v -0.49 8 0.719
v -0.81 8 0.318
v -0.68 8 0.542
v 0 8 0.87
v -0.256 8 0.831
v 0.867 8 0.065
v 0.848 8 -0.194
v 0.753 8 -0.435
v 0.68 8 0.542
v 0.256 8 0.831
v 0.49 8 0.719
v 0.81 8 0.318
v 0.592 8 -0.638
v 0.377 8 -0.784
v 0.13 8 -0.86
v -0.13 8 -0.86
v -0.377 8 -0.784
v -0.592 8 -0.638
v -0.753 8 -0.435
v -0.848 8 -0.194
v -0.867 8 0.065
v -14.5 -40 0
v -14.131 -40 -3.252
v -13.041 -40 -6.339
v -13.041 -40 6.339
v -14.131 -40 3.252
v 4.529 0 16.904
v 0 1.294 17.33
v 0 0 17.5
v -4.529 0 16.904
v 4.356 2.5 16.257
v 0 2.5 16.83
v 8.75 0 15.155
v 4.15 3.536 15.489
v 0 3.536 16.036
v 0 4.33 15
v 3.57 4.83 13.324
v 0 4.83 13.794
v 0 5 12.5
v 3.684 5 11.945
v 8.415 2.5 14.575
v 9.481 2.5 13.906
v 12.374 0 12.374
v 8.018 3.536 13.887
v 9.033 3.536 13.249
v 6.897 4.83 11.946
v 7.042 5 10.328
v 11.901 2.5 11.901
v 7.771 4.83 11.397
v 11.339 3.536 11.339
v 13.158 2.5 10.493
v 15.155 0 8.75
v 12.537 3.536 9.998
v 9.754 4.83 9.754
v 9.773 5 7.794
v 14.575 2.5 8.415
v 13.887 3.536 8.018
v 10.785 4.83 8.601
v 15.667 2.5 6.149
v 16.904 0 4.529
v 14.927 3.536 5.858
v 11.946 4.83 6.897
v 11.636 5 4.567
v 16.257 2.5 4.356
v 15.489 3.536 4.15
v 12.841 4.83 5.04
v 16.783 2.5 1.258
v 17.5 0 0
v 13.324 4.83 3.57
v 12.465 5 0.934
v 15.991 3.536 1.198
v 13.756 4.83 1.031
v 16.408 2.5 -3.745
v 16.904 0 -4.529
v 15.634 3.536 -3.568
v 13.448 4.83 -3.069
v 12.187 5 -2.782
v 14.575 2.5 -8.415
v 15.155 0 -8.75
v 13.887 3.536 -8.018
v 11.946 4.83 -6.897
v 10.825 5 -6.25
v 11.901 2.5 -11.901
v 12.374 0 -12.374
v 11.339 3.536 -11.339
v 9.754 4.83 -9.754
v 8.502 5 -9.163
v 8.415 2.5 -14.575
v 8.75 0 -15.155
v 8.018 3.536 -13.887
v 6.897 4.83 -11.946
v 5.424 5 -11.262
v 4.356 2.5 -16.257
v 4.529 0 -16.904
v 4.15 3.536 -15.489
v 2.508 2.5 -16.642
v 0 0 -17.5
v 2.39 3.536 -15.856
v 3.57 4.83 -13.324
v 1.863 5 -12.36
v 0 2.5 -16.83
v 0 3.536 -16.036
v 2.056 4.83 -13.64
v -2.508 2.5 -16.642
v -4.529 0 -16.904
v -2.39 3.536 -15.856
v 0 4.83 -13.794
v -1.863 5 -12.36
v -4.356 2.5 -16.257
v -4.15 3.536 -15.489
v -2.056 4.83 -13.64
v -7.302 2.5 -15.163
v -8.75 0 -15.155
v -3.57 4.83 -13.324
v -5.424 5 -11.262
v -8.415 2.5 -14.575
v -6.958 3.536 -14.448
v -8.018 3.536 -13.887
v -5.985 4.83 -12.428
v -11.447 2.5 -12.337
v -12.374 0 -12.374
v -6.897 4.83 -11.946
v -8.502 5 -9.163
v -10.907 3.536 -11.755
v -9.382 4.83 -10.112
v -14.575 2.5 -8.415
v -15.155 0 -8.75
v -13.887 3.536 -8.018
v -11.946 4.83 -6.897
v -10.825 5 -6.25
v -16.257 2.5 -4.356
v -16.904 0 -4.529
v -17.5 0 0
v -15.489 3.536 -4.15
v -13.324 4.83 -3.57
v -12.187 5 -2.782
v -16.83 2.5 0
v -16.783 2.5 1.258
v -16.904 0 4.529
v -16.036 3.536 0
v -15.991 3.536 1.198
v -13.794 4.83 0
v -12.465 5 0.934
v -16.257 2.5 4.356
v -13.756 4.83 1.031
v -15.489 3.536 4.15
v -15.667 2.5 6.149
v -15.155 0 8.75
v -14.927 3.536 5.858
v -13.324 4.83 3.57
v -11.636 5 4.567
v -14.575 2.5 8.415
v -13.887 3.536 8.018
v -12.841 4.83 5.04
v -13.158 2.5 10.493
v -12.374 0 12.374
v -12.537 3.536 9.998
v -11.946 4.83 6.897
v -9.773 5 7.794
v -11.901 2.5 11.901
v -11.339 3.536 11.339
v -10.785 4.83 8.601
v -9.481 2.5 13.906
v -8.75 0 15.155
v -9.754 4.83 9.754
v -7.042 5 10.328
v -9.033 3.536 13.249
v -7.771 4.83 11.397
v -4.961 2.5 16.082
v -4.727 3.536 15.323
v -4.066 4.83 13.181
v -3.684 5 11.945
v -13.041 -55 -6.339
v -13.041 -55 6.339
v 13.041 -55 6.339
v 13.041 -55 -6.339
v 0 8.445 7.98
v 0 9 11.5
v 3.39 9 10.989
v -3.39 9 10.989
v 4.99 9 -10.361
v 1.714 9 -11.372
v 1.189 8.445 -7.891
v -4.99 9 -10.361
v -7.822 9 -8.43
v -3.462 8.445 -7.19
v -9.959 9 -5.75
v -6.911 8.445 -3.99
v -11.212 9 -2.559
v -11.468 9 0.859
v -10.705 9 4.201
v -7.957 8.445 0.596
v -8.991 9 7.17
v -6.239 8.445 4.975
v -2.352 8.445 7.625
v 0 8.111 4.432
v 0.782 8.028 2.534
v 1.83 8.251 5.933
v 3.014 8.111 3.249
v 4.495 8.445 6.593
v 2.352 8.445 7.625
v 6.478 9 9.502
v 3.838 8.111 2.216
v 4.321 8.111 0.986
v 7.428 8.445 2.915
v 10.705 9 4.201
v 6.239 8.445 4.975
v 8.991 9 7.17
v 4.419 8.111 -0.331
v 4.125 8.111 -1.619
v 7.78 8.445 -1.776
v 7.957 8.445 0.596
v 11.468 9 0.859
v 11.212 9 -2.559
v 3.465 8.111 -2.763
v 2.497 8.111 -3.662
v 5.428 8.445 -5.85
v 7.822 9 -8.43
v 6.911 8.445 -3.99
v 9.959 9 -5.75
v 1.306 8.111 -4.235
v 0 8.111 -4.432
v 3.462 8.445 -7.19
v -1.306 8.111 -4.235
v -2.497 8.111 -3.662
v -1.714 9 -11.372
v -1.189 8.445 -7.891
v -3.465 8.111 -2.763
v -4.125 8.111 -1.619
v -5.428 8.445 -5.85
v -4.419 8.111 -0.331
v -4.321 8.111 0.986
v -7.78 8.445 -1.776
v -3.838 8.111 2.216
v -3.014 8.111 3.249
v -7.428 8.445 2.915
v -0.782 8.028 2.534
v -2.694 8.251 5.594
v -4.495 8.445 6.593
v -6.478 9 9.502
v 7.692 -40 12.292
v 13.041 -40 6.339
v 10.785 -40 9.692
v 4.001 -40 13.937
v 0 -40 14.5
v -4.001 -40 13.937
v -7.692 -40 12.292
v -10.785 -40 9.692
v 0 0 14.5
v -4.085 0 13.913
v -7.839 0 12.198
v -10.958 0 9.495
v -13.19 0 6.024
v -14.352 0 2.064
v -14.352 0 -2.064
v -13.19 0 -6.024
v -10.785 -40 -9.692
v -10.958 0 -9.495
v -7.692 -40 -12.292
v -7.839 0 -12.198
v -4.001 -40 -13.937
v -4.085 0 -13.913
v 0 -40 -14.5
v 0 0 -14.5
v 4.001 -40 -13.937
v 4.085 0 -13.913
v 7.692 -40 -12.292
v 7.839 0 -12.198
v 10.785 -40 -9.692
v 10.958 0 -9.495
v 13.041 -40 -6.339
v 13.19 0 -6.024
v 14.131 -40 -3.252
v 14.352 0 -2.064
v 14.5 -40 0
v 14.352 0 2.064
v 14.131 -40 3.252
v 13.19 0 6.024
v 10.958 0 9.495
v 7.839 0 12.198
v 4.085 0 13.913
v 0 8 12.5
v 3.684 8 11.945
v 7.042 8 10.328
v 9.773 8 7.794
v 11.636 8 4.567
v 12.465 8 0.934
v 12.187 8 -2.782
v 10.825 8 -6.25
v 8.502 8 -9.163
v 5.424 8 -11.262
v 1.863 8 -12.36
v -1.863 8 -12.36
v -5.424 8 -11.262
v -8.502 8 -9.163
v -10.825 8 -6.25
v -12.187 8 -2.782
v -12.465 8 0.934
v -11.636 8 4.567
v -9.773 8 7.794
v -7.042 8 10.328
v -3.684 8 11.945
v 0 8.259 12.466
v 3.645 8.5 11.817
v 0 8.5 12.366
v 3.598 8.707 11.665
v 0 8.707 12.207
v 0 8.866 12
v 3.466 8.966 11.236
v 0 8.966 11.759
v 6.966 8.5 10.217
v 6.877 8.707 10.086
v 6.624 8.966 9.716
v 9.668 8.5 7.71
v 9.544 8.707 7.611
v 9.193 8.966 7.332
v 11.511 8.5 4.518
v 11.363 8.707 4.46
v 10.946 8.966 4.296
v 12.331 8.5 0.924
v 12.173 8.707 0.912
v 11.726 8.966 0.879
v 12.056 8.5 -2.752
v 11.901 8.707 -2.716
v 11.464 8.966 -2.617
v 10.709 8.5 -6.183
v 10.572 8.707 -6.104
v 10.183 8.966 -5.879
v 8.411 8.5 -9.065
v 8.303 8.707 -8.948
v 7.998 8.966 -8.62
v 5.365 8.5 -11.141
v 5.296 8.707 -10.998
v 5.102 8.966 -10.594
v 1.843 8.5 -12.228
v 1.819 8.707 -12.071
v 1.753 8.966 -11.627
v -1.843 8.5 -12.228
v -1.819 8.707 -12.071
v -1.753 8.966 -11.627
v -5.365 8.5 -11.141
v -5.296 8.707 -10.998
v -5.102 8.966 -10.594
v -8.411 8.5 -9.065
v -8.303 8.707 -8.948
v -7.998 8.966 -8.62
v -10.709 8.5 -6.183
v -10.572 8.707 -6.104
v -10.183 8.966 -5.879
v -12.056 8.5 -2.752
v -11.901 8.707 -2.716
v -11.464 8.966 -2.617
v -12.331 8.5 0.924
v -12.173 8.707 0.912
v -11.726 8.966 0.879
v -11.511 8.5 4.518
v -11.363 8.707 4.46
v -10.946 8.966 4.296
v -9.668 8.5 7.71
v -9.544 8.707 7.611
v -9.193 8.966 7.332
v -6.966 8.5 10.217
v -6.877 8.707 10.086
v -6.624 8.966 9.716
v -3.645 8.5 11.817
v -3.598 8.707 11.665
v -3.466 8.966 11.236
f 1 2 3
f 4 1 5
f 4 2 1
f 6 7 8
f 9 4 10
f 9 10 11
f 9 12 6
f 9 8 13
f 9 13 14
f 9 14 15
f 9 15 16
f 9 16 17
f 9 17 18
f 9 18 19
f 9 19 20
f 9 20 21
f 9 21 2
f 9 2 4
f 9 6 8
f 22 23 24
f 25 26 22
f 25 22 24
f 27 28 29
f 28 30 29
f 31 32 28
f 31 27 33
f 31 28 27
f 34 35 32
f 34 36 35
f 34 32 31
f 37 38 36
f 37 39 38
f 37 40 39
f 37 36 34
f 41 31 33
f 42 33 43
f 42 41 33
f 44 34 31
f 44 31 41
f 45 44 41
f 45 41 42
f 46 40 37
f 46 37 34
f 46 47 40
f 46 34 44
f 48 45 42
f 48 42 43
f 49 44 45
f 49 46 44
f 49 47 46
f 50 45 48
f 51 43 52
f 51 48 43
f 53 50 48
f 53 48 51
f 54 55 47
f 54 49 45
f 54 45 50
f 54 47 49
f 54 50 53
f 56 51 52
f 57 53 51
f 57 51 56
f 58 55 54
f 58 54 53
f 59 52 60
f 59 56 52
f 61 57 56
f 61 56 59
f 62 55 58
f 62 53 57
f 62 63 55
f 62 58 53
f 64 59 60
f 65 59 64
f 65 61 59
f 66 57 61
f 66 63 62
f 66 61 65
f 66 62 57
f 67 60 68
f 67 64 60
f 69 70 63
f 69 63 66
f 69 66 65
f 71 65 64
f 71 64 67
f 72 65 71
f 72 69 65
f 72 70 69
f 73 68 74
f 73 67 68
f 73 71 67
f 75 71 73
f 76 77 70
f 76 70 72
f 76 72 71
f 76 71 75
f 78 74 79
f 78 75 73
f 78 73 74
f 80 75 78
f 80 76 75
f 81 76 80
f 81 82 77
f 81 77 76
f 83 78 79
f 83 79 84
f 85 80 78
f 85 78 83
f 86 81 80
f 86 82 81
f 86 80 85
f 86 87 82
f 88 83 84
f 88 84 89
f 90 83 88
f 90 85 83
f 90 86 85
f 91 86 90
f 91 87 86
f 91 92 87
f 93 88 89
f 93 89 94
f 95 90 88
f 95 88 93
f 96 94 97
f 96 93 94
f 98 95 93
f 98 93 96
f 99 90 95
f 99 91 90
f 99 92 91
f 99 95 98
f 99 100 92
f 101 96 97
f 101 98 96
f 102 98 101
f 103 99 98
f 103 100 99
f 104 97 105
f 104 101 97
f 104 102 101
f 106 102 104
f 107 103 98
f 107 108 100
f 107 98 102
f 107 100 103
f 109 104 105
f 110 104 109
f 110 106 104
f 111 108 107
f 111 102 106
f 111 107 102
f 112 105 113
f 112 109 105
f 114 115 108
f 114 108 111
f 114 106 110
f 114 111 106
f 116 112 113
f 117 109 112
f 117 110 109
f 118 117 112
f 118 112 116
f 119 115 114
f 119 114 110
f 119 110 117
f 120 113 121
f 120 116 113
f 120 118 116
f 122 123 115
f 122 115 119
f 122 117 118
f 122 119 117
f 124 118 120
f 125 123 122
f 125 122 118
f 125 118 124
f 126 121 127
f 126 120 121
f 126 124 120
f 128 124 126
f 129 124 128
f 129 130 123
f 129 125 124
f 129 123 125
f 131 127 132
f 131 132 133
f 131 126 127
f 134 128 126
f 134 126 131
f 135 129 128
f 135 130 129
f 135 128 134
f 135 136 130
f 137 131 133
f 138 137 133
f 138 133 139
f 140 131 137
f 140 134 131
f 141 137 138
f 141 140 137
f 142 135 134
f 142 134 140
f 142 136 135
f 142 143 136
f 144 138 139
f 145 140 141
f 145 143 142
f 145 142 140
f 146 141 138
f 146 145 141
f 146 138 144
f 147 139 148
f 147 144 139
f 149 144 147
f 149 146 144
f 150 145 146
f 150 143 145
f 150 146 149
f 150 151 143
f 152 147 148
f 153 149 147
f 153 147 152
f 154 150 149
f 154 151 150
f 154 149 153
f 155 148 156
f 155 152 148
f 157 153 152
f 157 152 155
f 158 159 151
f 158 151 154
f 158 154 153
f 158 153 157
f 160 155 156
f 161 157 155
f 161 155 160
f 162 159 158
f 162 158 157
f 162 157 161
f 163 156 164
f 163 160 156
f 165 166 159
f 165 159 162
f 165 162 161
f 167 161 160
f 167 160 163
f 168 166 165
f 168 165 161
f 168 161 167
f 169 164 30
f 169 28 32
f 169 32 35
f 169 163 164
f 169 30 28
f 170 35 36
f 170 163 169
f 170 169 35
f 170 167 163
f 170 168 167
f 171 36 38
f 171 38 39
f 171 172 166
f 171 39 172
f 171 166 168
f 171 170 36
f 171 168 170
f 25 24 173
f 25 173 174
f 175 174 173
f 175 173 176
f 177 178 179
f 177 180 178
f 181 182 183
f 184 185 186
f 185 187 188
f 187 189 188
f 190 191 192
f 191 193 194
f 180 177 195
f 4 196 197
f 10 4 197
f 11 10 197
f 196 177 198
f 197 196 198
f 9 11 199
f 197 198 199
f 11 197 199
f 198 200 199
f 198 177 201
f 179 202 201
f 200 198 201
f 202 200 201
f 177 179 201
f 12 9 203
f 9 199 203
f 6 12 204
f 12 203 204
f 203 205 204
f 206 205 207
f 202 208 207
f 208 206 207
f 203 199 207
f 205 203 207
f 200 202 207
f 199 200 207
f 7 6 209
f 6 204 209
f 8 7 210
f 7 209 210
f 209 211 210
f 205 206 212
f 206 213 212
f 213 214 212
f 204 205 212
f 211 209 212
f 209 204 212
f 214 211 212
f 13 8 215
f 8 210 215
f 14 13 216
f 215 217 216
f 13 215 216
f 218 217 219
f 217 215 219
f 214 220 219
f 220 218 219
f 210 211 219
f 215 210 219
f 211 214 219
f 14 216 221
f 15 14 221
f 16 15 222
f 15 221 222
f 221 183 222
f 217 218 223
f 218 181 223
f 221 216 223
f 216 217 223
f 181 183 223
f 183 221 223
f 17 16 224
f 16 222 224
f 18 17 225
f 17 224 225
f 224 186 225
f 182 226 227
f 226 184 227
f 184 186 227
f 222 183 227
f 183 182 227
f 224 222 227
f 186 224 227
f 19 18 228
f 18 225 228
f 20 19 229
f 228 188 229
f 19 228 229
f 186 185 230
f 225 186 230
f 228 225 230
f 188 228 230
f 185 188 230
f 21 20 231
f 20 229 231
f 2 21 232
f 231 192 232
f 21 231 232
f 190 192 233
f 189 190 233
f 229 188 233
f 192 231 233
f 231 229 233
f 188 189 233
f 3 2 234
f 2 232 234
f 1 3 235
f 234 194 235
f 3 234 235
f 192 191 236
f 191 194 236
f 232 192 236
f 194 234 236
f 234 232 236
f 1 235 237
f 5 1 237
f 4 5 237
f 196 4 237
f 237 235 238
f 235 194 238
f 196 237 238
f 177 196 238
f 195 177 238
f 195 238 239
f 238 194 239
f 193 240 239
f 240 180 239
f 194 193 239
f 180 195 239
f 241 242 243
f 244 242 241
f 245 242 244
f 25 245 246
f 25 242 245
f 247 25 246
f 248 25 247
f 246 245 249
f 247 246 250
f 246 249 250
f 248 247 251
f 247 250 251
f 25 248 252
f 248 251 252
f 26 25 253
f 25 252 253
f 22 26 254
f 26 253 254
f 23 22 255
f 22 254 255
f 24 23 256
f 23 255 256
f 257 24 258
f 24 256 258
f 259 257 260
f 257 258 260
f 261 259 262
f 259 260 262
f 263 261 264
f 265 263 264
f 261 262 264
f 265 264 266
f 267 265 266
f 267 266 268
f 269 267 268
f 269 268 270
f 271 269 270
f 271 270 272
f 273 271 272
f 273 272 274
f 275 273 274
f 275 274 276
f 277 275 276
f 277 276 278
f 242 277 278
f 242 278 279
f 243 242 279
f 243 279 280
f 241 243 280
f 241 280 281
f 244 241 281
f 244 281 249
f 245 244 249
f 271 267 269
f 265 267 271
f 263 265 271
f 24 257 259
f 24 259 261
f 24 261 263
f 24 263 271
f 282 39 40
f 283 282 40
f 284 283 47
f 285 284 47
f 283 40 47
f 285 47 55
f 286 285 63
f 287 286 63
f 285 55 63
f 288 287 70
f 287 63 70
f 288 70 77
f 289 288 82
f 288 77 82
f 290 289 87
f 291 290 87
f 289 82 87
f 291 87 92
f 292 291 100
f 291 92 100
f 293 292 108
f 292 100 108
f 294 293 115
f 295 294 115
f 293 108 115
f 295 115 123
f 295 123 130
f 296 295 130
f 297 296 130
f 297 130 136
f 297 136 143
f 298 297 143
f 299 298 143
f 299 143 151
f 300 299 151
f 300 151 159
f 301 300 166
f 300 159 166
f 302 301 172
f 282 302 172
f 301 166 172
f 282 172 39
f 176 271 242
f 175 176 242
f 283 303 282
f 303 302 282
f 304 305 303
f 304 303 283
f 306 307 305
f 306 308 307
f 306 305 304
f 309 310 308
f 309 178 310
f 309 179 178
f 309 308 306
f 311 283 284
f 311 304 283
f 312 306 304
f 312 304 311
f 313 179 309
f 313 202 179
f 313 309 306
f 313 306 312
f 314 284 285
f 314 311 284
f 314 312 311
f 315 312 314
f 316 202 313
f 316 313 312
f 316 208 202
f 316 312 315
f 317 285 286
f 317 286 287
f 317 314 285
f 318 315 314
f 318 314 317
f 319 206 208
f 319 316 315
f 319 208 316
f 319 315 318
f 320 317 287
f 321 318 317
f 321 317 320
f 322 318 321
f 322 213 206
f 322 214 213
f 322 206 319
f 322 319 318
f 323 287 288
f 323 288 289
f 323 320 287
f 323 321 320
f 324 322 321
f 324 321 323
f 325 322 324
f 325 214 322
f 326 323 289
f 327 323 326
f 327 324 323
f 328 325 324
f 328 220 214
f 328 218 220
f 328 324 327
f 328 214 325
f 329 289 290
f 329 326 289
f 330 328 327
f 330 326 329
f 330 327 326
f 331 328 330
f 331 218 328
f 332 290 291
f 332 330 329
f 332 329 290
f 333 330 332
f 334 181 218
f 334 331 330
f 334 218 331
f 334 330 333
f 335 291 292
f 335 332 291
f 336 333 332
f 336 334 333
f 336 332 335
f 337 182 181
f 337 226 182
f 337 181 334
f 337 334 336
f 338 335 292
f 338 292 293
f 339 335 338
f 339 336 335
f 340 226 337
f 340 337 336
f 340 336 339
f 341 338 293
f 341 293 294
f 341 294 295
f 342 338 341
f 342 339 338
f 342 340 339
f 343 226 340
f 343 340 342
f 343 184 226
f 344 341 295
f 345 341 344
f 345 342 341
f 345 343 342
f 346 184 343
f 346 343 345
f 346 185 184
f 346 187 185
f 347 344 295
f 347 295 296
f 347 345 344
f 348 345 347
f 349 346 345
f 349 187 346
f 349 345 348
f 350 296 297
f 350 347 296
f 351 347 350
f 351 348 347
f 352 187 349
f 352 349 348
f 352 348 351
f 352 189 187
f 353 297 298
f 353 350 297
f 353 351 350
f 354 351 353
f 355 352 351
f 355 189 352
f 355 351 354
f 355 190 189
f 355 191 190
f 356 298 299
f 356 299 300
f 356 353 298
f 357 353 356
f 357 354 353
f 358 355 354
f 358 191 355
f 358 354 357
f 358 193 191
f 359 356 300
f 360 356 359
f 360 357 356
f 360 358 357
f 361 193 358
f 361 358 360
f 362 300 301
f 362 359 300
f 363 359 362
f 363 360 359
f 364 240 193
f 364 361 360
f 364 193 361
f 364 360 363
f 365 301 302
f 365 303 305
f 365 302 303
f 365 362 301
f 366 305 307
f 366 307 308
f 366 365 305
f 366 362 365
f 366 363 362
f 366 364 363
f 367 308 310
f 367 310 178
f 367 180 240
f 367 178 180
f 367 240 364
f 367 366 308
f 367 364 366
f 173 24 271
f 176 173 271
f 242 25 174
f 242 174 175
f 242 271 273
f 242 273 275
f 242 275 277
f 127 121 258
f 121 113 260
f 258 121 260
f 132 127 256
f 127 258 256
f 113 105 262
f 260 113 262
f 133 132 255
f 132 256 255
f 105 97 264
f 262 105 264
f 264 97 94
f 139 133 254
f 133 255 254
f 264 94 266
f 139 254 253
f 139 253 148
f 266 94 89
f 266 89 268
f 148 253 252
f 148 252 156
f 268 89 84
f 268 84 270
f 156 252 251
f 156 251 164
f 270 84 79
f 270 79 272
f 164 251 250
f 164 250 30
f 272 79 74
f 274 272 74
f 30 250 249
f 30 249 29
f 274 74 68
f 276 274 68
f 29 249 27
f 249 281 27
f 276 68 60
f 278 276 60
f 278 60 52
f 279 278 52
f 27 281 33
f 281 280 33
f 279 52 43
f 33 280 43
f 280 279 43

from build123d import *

# Parameters (mm, degrees)
SKETCH1_R           = 17.5
BOSS_EXTRUDE1_DEPTH = 5
FILLET1_R           = 5
SKETCH2_R           = 12.5
BOSS_EXTRUDE2_DEPTH = 4
FILLET2_R           = 1
SKETCH3_R           = 11.5
CUT_EXTRUDE1_DEPTH  = 1
FILLET5_R           = 57
SKETCH5_R           = 14.5
BOSS_EXTRUDE3_DEPTH = 40
SKETCH6_W           = 26.081932022
SKETCH6_H           = 12.67804488
BOSS_EXTRUDE4_DEPTH = 15


# Some blends are built 0.0001 mm under size
with BuildPart() as part:
    # Sketch1 → Boss-Extrude1 (new body)
    with BuildSketch(Plane(origin=(0, 0, 0), x_dir=(1, 0, 0), z_dir=(0, 1, 0))):
        with Locations(Location((0, 0, 0), (0, 0, 270))):
            Circle(SKETCH1_R)
    extrude(amount=BOSS_EXTRUDE1_DEPTH)

    # Fillet1
    fillet1_edges = [part.edges().sort_by_distance(p)[0] for p in [
        (0, 5, -17.5),
    ]]
    fillet(fillet1_edges, radius=FILLET1_R - 0.0001)  # a hair under: the kernel refuses the full size

    # Sketch2 → Boss-Extrude2 (add)
    with BuildSketch(Plane(origin=(0, 5, 0), x_dir=(1, 0, 0), z_dir=(0, 1, 0))):
        with Locations(Location((0, 0, 0), (0, 0, 270))):
            Circle(SKETCH2_R)
    extrude(amount=BOSS_EXTRUDE2_DEPTH)

    # Fillet2
    fillet2_edges = [part.edges().sort_by_distance(p)[0] for p in [
        (0, 9, -12.5),
    ]]
    fillet(fillet2_edges, radius=FILLET2_R)

    # Sketch3 → Cut-Extrude1 (cut)
    with BuildSketch(Plane(origin=(0, 9, 0), x_dir=(1, 0, 0), z_dir=(0, 1, 0))):
        with Locations(Location((0, 0, 0), (0, 0, 270))):
            Circle(SKETCH3_R)
    extrude(amount=-CUT_EXTRUDE1_DEPTH, mode=Mode.SUBTRACT)

    # Fillet5
    # the kernel refuses this fillet: 57 mm, written as the material it adds along each edge
    with BuildSketch(Plane(origin=(0, 8, 0), x_dir=(0, 0, 1), z_dir=(-1, 0, 0))) as fillet5_piece_1:
        with BuildLine():
            CenterArc((0.869854187, 57), FILLET5_R, 270, 10.748235858)
            Line((0.869854187, 0), (11.5, 0))
            Line((11.5, 0), (11.5, 1))
        make_face()
    revolve(axis=Axis((0, 8, 0), (0, 1, 0)))

    # Sketch5 → Boss-Extrude3 (add)
    with BuildSketch(Plane.XZ):
        with Locations(Location((0, 0, 0), (0, 0, 90))):
            Circle(SKETCH5_R)
    extrude(amount=BOSS_EXTRUDE3_DEPTH)

    # Sketch6 → Boss-Extrude4 (add)
    with BuildSketch(Plane.XZ.offset(40)):
        Rectangle(SKETCH6_W, SKETCH6_H)
    extrude(amount=BOSS_EXTRUDE4_DEPTH)


solid = part.part
